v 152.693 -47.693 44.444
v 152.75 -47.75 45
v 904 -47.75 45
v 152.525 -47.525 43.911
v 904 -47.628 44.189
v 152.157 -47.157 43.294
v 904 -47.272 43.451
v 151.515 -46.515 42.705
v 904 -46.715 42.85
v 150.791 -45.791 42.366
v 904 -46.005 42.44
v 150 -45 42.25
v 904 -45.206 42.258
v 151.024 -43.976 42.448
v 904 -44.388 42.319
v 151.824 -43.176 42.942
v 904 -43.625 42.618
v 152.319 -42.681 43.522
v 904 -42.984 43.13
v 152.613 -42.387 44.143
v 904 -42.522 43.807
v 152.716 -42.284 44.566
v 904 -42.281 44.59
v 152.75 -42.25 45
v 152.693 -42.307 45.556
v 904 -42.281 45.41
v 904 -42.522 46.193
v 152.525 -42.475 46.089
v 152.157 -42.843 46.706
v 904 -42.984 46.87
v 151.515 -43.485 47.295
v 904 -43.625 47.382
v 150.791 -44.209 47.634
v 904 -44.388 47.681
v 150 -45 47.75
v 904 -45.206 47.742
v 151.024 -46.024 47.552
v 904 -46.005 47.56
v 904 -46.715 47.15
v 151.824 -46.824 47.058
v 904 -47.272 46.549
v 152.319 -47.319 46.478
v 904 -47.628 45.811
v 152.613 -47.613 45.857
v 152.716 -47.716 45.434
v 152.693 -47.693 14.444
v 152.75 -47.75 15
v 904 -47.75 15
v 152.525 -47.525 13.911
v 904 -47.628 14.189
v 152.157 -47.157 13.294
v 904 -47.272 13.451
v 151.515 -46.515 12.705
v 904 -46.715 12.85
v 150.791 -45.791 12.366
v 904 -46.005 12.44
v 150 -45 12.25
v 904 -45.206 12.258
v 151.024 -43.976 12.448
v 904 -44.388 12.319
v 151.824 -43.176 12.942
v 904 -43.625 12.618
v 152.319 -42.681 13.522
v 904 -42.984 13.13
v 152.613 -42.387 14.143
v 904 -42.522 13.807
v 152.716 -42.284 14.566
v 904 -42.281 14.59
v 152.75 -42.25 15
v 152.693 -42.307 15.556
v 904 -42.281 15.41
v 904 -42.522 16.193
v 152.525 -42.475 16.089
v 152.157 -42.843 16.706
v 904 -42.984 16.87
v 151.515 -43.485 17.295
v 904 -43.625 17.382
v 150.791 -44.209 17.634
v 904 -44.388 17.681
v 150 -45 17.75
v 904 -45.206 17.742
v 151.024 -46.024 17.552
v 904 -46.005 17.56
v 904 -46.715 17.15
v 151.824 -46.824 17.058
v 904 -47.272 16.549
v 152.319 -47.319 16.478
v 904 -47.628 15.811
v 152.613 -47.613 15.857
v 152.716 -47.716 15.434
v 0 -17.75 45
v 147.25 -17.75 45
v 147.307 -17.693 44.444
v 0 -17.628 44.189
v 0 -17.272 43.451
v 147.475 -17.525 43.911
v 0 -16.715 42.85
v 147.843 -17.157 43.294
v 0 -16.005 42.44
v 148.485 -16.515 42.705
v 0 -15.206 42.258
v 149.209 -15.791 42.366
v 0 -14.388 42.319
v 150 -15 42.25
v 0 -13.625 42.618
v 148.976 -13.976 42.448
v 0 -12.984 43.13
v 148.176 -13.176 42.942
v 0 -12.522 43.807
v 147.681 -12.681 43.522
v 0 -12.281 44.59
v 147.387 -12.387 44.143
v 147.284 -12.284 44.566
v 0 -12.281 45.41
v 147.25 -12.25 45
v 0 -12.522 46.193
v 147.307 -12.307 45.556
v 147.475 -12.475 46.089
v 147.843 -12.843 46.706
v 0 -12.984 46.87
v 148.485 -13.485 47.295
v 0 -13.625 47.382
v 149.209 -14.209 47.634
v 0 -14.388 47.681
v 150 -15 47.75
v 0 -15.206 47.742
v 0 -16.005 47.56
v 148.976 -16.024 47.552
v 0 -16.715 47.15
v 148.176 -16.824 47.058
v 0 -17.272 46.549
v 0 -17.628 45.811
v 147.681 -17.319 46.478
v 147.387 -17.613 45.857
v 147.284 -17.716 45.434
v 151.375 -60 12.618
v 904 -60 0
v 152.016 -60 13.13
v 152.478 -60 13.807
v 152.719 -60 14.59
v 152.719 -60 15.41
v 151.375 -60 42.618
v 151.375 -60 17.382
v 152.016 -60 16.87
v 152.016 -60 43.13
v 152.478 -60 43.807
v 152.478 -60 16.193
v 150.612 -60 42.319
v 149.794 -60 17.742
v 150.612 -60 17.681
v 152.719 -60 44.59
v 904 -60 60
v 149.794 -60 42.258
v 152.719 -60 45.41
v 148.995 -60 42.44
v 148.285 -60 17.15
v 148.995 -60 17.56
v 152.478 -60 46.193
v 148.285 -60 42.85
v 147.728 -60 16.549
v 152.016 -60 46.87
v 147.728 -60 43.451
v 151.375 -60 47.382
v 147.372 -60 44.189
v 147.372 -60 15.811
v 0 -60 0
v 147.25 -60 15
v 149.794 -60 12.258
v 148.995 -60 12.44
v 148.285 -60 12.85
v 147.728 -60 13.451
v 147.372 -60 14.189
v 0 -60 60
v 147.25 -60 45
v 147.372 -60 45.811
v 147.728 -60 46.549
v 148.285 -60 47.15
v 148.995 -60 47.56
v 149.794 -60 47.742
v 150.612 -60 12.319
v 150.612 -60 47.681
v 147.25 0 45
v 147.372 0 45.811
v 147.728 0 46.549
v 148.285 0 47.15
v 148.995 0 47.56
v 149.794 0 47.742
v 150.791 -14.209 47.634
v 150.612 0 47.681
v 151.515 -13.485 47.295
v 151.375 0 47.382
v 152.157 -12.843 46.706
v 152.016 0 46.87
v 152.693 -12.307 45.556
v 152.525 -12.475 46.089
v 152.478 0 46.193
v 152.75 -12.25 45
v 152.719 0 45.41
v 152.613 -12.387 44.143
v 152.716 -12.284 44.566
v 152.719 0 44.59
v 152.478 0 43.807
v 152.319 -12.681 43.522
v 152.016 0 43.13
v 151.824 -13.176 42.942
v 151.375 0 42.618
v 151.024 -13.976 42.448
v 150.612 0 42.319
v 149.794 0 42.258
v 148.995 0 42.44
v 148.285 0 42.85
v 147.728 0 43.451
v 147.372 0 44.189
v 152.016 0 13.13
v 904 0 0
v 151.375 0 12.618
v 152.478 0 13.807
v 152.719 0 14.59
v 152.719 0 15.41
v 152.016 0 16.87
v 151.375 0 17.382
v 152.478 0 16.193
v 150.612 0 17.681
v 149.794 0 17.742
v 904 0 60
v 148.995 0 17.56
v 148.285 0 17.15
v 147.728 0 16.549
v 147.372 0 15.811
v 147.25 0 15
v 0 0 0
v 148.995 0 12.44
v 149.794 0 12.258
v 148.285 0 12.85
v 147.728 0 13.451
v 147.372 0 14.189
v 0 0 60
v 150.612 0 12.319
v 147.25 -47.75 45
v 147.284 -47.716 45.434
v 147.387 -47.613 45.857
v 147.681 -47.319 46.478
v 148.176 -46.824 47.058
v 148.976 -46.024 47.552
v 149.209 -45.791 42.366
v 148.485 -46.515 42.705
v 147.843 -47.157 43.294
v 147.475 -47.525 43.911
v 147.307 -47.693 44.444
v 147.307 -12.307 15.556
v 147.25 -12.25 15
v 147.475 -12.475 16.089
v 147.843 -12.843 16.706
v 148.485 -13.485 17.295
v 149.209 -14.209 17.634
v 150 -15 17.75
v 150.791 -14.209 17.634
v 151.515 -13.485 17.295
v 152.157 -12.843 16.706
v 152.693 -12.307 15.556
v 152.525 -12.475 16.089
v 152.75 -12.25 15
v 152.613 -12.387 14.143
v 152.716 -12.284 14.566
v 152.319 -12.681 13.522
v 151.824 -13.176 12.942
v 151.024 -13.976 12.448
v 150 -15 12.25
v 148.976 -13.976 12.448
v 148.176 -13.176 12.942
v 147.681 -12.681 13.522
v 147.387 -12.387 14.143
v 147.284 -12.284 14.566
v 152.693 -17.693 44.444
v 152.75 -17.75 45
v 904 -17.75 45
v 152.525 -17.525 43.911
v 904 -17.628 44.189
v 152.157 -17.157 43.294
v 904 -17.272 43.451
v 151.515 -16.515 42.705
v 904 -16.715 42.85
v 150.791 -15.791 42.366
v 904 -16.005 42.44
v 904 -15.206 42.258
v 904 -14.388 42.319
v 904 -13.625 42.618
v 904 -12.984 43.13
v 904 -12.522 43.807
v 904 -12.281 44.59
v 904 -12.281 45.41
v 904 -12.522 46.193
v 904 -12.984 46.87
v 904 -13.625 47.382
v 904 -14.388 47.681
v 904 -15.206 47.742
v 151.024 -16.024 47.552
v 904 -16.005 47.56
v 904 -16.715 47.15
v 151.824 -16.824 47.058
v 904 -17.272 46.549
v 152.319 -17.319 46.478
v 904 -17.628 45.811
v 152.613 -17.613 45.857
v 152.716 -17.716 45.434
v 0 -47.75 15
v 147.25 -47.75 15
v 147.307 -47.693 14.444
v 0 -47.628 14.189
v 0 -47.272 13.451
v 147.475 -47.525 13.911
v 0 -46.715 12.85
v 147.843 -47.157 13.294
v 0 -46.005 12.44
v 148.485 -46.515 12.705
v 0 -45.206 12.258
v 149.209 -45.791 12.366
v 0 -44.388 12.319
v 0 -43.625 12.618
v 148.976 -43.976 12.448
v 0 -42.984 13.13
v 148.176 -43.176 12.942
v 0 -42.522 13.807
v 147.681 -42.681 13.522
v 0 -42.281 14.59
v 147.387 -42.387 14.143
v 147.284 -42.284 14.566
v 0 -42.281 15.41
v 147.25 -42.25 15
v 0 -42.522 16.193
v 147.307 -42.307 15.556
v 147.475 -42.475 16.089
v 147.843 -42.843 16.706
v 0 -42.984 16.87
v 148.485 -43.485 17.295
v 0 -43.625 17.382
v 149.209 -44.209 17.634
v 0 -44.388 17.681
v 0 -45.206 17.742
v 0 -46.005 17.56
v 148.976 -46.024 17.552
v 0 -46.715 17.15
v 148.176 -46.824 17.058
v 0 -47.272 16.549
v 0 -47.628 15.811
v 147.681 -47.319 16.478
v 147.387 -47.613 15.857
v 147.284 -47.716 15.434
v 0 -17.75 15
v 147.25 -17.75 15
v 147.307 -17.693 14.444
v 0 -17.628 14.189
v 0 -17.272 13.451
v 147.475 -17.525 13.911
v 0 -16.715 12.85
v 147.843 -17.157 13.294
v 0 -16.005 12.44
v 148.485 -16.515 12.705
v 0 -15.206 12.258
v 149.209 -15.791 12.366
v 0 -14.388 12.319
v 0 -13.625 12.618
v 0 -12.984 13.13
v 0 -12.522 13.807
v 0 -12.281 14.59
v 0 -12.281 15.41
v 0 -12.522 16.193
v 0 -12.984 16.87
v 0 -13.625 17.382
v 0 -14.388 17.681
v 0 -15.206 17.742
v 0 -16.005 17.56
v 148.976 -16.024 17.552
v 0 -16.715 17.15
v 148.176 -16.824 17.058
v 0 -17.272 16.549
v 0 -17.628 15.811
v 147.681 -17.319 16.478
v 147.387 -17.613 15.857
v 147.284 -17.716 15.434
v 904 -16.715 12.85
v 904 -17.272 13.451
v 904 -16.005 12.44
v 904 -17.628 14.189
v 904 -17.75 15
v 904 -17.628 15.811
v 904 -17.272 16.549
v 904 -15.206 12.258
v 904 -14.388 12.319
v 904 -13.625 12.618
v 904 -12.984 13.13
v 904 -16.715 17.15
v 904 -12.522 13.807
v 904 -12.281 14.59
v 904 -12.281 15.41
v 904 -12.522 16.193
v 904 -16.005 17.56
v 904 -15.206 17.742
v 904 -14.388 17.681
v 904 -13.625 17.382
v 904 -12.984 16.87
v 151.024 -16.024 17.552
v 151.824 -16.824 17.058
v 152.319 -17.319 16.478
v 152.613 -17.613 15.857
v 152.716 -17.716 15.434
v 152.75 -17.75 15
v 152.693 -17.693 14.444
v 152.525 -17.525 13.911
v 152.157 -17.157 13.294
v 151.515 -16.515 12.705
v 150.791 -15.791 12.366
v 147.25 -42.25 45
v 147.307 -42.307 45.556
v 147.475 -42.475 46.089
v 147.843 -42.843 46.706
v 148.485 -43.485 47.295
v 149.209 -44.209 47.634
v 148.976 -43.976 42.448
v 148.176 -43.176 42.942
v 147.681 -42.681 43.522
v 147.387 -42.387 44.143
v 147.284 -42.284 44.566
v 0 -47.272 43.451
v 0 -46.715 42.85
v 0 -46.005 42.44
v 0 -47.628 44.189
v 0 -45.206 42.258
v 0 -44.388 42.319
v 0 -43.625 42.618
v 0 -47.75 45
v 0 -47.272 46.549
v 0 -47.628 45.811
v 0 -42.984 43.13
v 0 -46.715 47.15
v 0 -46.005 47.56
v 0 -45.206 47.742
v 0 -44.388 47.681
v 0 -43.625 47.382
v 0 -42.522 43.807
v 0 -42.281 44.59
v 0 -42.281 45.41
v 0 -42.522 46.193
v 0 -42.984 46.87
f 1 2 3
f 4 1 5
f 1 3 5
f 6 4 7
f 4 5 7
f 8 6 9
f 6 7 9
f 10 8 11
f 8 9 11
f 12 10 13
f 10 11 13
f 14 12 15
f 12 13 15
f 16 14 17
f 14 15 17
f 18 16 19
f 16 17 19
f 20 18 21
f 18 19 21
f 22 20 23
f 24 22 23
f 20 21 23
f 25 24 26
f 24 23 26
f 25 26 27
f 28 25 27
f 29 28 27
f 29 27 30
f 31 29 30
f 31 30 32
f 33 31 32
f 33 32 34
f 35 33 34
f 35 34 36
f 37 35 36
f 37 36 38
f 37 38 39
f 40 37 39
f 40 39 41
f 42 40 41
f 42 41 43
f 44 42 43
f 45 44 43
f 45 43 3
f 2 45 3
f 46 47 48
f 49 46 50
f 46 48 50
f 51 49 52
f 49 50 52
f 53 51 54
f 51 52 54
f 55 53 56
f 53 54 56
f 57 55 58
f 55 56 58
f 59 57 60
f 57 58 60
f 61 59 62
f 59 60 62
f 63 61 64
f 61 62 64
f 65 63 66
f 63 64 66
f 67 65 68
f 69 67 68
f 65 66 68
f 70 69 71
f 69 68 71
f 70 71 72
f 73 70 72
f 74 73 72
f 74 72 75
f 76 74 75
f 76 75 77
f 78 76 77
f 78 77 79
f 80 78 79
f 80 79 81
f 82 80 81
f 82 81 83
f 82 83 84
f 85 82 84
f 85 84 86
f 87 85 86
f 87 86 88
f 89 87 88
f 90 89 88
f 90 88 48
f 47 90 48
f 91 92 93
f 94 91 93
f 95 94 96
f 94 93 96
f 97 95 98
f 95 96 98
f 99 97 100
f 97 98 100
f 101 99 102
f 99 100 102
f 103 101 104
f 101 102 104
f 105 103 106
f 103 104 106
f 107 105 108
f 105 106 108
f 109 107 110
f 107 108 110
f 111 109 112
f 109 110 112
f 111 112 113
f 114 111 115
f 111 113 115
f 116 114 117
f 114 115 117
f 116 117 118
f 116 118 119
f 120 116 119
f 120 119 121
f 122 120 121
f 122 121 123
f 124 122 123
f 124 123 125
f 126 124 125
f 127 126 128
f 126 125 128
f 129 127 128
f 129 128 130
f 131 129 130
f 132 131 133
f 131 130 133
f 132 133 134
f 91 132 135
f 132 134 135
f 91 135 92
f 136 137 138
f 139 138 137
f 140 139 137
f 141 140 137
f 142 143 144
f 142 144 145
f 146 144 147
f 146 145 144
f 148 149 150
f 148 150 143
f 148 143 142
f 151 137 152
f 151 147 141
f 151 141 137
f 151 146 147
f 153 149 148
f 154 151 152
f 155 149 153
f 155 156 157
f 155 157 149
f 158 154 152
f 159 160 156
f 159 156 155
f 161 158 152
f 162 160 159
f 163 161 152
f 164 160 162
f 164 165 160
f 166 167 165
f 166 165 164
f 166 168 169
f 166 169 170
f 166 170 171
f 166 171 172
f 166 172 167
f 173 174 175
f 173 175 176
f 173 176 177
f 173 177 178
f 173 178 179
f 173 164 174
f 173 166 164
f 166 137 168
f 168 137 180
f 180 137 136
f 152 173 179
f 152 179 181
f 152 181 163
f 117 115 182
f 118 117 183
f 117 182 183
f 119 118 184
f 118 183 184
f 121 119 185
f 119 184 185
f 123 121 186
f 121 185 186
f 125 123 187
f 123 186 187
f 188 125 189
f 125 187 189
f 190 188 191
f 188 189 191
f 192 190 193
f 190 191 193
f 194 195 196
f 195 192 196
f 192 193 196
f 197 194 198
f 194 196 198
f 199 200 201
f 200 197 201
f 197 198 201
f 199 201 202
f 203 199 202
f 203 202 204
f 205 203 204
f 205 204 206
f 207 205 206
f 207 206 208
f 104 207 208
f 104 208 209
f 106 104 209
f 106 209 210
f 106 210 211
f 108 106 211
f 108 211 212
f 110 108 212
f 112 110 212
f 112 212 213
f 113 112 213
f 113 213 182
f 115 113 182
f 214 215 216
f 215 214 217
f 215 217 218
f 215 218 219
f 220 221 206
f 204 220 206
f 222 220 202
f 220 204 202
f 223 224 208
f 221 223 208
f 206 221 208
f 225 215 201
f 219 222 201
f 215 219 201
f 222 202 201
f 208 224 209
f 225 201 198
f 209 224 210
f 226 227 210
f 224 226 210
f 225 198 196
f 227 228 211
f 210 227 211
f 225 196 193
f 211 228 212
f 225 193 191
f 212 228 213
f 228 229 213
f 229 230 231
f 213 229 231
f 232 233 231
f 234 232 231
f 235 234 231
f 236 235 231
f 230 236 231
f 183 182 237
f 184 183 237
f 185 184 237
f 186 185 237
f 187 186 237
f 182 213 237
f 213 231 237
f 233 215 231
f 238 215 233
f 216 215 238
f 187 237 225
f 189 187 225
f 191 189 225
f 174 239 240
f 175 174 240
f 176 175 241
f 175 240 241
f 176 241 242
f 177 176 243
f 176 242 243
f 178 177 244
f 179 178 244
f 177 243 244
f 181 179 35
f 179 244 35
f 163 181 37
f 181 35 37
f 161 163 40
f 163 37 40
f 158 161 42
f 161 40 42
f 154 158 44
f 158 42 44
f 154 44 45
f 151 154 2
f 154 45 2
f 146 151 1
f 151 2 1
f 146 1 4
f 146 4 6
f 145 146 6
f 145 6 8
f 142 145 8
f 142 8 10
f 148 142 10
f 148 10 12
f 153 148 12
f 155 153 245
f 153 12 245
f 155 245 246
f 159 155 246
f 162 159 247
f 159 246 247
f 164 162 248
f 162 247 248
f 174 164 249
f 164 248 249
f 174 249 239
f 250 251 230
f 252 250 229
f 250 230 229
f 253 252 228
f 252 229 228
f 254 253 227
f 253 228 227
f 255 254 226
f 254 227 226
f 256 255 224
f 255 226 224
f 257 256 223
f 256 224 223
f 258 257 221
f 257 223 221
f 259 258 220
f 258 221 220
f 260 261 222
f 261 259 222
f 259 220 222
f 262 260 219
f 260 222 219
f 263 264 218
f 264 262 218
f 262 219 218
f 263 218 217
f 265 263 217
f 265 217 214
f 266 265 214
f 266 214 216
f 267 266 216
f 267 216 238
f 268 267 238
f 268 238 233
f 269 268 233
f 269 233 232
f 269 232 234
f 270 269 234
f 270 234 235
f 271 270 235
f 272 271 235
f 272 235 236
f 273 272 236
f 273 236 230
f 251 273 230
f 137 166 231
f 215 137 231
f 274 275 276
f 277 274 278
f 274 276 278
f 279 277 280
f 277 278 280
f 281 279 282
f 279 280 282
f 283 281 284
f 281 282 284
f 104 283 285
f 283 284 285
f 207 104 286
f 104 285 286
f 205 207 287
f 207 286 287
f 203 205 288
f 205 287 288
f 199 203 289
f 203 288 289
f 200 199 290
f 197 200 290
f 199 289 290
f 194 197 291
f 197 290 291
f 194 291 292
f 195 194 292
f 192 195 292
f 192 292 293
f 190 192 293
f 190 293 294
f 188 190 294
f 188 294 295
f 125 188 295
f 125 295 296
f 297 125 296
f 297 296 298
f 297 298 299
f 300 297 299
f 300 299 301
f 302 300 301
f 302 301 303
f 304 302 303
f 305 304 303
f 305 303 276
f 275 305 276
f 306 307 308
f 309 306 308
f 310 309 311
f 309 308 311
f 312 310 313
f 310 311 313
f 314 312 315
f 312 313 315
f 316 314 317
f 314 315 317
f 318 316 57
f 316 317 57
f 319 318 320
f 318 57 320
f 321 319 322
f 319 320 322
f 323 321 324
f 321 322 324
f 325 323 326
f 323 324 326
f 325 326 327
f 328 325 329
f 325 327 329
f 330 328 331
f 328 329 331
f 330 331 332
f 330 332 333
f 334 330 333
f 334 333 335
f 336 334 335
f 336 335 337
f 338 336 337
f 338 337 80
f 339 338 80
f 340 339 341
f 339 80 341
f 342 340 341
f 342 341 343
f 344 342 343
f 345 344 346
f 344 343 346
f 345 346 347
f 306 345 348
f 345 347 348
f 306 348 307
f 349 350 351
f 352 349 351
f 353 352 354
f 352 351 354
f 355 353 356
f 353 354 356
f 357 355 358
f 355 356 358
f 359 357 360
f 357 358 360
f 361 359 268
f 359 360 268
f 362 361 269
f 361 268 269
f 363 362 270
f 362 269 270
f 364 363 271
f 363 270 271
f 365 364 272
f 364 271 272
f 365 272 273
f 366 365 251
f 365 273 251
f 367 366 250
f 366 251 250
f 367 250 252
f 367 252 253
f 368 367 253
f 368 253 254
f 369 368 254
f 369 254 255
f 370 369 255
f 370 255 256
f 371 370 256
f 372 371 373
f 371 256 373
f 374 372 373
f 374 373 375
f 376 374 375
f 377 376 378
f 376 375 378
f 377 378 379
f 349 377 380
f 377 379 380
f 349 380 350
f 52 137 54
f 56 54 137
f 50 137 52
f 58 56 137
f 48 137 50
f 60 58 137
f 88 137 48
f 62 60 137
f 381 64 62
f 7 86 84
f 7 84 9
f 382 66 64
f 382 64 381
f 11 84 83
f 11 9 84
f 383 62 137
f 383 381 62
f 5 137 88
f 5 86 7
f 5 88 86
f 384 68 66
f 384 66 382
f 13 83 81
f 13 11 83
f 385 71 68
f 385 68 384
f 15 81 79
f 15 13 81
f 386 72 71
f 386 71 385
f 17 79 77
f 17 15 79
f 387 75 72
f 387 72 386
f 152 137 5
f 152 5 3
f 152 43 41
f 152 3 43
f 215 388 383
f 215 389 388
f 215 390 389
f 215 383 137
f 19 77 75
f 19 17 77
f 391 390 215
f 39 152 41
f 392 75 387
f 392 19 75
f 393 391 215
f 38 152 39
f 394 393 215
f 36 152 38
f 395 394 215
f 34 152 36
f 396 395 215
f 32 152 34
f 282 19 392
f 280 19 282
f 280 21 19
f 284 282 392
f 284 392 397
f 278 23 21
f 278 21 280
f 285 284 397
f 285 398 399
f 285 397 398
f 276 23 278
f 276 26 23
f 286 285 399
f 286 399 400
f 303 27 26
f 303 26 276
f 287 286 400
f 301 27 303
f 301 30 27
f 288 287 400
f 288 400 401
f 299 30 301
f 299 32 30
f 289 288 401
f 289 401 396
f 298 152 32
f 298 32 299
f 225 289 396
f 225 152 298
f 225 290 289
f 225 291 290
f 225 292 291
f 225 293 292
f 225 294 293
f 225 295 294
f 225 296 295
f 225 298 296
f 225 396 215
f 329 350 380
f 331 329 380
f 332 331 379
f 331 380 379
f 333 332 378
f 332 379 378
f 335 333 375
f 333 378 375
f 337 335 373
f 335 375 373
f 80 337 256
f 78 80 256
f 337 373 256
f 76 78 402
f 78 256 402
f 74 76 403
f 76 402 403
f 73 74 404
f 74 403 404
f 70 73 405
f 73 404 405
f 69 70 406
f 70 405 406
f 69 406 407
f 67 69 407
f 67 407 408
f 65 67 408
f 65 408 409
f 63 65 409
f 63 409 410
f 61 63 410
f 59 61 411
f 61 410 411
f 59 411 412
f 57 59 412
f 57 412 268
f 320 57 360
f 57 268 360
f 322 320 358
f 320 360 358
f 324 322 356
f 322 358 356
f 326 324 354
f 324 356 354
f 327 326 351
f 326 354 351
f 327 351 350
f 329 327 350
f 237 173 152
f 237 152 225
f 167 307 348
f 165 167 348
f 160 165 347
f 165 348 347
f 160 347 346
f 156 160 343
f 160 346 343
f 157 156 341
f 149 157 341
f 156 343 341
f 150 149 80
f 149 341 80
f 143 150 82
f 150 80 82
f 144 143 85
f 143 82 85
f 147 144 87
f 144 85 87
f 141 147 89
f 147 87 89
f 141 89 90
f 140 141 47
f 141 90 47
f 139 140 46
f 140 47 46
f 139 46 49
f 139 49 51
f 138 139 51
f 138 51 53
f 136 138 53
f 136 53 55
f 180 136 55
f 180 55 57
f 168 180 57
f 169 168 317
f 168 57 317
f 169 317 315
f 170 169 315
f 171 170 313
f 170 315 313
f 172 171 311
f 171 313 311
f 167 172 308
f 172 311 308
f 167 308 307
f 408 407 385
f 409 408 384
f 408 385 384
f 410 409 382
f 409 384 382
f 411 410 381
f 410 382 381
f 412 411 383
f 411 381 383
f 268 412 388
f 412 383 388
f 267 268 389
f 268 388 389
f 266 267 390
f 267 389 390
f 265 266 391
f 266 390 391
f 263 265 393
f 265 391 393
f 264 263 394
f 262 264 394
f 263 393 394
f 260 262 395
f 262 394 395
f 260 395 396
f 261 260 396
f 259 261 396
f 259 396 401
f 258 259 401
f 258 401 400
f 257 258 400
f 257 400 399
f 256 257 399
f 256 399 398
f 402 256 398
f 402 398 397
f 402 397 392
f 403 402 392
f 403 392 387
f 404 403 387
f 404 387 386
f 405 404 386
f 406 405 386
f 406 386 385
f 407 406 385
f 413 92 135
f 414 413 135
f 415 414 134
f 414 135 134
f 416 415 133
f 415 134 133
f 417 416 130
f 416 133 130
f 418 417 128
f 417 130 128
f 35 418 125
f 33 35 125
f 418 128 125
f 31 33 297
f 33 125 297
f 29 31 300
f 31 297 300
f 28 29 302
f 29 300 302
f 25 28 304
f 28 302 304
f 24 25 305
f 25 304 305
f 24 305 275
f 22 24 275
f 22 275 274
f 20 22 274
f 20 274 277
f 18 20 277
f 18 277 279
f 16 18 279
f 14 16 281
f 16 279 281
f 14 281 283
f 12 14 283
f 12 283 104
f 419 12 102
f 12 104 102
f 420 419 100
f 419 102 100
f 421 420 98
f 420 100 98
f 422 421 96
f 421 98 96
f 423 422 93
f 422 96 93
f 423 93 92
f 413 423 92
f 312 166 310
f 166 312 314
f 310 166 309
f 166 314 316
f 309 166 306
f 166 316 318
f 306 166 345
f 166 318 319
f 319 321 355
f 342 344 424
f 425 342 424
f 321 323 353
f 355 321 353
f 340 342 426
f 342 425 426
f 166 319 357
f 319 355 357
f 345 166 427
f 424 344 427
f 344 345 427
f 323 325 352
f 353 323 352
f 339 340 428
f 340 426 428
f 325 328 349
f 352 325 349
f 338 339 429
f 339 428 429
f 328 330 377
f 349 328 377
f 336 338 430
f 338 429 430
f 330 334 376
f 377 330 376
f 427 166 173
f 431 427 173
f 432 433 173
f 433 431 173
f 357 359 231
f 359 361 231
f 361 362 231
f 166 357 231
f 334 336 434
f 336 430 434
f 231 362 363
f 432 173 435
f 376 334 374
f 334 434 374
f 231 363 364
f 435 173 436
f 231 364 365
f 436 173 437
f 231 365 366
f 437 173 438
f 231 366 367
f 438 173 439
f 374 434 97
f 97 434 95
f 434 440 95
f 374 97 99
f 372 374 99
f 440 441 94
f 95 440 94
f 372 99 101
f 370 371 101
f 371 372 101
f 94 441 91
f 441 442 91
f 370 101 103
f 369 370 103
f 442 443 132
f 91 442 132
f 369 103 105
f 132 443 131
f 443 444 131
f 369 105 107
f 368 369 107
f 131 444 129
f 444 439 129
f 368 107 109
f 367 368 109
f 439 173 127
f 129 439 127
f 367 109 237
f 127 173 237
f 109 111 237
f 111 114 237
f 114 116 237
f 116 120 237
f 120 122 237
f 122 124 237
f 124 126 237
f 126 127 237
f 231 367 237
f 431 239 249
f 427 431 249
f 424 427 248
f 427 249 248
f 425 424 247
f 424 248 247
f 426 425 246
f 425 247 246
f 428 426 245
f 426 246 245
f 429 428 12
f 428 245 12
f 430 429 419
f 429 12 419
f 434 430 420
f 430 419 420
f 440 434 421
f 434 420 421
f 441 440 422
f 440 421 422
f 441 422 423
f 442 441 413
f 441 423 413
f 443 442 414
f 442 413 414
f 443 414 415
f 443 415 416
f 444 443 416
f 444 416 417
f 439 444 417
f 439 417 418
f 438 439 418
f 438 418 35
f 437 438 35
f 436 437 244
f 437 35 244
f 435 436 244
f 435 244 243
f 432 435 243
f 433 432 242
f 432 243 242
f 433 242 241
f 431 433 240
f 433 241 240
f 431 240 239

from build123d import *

# Parameters (mm, degrees)
F0_W     = 60
F0_H     = 60
F1_DEPTH = 904
F2_D     = 5.5
F4_D     = 5.5


with BuildPart() as f1:
    # F0 (on Right) → F1 (new body)
    with BuildSketch(Plane.YZ):
        with Locations((-30, 30)):
            Rectangle(F0_W, F0_H)
    extrude(amount=F1_DEPTH)

    # F2 (through all)
    with Locations(Plane(origin=(0, 0, 0), x_dir=(0, 1, 0), z_dir=(-1, 0, 0))):
        with Locations((-45, -45), (-45, -15), (-15, -15), (-15, -45)):
            Hole(F2_D / 2)

    # F4 (through all)
    with Locations(Plane.XZ.offset(60)):
        with Locations((150, 45), (150, 15)):
            Hole(F4_D / 2)


solid = f1.part
